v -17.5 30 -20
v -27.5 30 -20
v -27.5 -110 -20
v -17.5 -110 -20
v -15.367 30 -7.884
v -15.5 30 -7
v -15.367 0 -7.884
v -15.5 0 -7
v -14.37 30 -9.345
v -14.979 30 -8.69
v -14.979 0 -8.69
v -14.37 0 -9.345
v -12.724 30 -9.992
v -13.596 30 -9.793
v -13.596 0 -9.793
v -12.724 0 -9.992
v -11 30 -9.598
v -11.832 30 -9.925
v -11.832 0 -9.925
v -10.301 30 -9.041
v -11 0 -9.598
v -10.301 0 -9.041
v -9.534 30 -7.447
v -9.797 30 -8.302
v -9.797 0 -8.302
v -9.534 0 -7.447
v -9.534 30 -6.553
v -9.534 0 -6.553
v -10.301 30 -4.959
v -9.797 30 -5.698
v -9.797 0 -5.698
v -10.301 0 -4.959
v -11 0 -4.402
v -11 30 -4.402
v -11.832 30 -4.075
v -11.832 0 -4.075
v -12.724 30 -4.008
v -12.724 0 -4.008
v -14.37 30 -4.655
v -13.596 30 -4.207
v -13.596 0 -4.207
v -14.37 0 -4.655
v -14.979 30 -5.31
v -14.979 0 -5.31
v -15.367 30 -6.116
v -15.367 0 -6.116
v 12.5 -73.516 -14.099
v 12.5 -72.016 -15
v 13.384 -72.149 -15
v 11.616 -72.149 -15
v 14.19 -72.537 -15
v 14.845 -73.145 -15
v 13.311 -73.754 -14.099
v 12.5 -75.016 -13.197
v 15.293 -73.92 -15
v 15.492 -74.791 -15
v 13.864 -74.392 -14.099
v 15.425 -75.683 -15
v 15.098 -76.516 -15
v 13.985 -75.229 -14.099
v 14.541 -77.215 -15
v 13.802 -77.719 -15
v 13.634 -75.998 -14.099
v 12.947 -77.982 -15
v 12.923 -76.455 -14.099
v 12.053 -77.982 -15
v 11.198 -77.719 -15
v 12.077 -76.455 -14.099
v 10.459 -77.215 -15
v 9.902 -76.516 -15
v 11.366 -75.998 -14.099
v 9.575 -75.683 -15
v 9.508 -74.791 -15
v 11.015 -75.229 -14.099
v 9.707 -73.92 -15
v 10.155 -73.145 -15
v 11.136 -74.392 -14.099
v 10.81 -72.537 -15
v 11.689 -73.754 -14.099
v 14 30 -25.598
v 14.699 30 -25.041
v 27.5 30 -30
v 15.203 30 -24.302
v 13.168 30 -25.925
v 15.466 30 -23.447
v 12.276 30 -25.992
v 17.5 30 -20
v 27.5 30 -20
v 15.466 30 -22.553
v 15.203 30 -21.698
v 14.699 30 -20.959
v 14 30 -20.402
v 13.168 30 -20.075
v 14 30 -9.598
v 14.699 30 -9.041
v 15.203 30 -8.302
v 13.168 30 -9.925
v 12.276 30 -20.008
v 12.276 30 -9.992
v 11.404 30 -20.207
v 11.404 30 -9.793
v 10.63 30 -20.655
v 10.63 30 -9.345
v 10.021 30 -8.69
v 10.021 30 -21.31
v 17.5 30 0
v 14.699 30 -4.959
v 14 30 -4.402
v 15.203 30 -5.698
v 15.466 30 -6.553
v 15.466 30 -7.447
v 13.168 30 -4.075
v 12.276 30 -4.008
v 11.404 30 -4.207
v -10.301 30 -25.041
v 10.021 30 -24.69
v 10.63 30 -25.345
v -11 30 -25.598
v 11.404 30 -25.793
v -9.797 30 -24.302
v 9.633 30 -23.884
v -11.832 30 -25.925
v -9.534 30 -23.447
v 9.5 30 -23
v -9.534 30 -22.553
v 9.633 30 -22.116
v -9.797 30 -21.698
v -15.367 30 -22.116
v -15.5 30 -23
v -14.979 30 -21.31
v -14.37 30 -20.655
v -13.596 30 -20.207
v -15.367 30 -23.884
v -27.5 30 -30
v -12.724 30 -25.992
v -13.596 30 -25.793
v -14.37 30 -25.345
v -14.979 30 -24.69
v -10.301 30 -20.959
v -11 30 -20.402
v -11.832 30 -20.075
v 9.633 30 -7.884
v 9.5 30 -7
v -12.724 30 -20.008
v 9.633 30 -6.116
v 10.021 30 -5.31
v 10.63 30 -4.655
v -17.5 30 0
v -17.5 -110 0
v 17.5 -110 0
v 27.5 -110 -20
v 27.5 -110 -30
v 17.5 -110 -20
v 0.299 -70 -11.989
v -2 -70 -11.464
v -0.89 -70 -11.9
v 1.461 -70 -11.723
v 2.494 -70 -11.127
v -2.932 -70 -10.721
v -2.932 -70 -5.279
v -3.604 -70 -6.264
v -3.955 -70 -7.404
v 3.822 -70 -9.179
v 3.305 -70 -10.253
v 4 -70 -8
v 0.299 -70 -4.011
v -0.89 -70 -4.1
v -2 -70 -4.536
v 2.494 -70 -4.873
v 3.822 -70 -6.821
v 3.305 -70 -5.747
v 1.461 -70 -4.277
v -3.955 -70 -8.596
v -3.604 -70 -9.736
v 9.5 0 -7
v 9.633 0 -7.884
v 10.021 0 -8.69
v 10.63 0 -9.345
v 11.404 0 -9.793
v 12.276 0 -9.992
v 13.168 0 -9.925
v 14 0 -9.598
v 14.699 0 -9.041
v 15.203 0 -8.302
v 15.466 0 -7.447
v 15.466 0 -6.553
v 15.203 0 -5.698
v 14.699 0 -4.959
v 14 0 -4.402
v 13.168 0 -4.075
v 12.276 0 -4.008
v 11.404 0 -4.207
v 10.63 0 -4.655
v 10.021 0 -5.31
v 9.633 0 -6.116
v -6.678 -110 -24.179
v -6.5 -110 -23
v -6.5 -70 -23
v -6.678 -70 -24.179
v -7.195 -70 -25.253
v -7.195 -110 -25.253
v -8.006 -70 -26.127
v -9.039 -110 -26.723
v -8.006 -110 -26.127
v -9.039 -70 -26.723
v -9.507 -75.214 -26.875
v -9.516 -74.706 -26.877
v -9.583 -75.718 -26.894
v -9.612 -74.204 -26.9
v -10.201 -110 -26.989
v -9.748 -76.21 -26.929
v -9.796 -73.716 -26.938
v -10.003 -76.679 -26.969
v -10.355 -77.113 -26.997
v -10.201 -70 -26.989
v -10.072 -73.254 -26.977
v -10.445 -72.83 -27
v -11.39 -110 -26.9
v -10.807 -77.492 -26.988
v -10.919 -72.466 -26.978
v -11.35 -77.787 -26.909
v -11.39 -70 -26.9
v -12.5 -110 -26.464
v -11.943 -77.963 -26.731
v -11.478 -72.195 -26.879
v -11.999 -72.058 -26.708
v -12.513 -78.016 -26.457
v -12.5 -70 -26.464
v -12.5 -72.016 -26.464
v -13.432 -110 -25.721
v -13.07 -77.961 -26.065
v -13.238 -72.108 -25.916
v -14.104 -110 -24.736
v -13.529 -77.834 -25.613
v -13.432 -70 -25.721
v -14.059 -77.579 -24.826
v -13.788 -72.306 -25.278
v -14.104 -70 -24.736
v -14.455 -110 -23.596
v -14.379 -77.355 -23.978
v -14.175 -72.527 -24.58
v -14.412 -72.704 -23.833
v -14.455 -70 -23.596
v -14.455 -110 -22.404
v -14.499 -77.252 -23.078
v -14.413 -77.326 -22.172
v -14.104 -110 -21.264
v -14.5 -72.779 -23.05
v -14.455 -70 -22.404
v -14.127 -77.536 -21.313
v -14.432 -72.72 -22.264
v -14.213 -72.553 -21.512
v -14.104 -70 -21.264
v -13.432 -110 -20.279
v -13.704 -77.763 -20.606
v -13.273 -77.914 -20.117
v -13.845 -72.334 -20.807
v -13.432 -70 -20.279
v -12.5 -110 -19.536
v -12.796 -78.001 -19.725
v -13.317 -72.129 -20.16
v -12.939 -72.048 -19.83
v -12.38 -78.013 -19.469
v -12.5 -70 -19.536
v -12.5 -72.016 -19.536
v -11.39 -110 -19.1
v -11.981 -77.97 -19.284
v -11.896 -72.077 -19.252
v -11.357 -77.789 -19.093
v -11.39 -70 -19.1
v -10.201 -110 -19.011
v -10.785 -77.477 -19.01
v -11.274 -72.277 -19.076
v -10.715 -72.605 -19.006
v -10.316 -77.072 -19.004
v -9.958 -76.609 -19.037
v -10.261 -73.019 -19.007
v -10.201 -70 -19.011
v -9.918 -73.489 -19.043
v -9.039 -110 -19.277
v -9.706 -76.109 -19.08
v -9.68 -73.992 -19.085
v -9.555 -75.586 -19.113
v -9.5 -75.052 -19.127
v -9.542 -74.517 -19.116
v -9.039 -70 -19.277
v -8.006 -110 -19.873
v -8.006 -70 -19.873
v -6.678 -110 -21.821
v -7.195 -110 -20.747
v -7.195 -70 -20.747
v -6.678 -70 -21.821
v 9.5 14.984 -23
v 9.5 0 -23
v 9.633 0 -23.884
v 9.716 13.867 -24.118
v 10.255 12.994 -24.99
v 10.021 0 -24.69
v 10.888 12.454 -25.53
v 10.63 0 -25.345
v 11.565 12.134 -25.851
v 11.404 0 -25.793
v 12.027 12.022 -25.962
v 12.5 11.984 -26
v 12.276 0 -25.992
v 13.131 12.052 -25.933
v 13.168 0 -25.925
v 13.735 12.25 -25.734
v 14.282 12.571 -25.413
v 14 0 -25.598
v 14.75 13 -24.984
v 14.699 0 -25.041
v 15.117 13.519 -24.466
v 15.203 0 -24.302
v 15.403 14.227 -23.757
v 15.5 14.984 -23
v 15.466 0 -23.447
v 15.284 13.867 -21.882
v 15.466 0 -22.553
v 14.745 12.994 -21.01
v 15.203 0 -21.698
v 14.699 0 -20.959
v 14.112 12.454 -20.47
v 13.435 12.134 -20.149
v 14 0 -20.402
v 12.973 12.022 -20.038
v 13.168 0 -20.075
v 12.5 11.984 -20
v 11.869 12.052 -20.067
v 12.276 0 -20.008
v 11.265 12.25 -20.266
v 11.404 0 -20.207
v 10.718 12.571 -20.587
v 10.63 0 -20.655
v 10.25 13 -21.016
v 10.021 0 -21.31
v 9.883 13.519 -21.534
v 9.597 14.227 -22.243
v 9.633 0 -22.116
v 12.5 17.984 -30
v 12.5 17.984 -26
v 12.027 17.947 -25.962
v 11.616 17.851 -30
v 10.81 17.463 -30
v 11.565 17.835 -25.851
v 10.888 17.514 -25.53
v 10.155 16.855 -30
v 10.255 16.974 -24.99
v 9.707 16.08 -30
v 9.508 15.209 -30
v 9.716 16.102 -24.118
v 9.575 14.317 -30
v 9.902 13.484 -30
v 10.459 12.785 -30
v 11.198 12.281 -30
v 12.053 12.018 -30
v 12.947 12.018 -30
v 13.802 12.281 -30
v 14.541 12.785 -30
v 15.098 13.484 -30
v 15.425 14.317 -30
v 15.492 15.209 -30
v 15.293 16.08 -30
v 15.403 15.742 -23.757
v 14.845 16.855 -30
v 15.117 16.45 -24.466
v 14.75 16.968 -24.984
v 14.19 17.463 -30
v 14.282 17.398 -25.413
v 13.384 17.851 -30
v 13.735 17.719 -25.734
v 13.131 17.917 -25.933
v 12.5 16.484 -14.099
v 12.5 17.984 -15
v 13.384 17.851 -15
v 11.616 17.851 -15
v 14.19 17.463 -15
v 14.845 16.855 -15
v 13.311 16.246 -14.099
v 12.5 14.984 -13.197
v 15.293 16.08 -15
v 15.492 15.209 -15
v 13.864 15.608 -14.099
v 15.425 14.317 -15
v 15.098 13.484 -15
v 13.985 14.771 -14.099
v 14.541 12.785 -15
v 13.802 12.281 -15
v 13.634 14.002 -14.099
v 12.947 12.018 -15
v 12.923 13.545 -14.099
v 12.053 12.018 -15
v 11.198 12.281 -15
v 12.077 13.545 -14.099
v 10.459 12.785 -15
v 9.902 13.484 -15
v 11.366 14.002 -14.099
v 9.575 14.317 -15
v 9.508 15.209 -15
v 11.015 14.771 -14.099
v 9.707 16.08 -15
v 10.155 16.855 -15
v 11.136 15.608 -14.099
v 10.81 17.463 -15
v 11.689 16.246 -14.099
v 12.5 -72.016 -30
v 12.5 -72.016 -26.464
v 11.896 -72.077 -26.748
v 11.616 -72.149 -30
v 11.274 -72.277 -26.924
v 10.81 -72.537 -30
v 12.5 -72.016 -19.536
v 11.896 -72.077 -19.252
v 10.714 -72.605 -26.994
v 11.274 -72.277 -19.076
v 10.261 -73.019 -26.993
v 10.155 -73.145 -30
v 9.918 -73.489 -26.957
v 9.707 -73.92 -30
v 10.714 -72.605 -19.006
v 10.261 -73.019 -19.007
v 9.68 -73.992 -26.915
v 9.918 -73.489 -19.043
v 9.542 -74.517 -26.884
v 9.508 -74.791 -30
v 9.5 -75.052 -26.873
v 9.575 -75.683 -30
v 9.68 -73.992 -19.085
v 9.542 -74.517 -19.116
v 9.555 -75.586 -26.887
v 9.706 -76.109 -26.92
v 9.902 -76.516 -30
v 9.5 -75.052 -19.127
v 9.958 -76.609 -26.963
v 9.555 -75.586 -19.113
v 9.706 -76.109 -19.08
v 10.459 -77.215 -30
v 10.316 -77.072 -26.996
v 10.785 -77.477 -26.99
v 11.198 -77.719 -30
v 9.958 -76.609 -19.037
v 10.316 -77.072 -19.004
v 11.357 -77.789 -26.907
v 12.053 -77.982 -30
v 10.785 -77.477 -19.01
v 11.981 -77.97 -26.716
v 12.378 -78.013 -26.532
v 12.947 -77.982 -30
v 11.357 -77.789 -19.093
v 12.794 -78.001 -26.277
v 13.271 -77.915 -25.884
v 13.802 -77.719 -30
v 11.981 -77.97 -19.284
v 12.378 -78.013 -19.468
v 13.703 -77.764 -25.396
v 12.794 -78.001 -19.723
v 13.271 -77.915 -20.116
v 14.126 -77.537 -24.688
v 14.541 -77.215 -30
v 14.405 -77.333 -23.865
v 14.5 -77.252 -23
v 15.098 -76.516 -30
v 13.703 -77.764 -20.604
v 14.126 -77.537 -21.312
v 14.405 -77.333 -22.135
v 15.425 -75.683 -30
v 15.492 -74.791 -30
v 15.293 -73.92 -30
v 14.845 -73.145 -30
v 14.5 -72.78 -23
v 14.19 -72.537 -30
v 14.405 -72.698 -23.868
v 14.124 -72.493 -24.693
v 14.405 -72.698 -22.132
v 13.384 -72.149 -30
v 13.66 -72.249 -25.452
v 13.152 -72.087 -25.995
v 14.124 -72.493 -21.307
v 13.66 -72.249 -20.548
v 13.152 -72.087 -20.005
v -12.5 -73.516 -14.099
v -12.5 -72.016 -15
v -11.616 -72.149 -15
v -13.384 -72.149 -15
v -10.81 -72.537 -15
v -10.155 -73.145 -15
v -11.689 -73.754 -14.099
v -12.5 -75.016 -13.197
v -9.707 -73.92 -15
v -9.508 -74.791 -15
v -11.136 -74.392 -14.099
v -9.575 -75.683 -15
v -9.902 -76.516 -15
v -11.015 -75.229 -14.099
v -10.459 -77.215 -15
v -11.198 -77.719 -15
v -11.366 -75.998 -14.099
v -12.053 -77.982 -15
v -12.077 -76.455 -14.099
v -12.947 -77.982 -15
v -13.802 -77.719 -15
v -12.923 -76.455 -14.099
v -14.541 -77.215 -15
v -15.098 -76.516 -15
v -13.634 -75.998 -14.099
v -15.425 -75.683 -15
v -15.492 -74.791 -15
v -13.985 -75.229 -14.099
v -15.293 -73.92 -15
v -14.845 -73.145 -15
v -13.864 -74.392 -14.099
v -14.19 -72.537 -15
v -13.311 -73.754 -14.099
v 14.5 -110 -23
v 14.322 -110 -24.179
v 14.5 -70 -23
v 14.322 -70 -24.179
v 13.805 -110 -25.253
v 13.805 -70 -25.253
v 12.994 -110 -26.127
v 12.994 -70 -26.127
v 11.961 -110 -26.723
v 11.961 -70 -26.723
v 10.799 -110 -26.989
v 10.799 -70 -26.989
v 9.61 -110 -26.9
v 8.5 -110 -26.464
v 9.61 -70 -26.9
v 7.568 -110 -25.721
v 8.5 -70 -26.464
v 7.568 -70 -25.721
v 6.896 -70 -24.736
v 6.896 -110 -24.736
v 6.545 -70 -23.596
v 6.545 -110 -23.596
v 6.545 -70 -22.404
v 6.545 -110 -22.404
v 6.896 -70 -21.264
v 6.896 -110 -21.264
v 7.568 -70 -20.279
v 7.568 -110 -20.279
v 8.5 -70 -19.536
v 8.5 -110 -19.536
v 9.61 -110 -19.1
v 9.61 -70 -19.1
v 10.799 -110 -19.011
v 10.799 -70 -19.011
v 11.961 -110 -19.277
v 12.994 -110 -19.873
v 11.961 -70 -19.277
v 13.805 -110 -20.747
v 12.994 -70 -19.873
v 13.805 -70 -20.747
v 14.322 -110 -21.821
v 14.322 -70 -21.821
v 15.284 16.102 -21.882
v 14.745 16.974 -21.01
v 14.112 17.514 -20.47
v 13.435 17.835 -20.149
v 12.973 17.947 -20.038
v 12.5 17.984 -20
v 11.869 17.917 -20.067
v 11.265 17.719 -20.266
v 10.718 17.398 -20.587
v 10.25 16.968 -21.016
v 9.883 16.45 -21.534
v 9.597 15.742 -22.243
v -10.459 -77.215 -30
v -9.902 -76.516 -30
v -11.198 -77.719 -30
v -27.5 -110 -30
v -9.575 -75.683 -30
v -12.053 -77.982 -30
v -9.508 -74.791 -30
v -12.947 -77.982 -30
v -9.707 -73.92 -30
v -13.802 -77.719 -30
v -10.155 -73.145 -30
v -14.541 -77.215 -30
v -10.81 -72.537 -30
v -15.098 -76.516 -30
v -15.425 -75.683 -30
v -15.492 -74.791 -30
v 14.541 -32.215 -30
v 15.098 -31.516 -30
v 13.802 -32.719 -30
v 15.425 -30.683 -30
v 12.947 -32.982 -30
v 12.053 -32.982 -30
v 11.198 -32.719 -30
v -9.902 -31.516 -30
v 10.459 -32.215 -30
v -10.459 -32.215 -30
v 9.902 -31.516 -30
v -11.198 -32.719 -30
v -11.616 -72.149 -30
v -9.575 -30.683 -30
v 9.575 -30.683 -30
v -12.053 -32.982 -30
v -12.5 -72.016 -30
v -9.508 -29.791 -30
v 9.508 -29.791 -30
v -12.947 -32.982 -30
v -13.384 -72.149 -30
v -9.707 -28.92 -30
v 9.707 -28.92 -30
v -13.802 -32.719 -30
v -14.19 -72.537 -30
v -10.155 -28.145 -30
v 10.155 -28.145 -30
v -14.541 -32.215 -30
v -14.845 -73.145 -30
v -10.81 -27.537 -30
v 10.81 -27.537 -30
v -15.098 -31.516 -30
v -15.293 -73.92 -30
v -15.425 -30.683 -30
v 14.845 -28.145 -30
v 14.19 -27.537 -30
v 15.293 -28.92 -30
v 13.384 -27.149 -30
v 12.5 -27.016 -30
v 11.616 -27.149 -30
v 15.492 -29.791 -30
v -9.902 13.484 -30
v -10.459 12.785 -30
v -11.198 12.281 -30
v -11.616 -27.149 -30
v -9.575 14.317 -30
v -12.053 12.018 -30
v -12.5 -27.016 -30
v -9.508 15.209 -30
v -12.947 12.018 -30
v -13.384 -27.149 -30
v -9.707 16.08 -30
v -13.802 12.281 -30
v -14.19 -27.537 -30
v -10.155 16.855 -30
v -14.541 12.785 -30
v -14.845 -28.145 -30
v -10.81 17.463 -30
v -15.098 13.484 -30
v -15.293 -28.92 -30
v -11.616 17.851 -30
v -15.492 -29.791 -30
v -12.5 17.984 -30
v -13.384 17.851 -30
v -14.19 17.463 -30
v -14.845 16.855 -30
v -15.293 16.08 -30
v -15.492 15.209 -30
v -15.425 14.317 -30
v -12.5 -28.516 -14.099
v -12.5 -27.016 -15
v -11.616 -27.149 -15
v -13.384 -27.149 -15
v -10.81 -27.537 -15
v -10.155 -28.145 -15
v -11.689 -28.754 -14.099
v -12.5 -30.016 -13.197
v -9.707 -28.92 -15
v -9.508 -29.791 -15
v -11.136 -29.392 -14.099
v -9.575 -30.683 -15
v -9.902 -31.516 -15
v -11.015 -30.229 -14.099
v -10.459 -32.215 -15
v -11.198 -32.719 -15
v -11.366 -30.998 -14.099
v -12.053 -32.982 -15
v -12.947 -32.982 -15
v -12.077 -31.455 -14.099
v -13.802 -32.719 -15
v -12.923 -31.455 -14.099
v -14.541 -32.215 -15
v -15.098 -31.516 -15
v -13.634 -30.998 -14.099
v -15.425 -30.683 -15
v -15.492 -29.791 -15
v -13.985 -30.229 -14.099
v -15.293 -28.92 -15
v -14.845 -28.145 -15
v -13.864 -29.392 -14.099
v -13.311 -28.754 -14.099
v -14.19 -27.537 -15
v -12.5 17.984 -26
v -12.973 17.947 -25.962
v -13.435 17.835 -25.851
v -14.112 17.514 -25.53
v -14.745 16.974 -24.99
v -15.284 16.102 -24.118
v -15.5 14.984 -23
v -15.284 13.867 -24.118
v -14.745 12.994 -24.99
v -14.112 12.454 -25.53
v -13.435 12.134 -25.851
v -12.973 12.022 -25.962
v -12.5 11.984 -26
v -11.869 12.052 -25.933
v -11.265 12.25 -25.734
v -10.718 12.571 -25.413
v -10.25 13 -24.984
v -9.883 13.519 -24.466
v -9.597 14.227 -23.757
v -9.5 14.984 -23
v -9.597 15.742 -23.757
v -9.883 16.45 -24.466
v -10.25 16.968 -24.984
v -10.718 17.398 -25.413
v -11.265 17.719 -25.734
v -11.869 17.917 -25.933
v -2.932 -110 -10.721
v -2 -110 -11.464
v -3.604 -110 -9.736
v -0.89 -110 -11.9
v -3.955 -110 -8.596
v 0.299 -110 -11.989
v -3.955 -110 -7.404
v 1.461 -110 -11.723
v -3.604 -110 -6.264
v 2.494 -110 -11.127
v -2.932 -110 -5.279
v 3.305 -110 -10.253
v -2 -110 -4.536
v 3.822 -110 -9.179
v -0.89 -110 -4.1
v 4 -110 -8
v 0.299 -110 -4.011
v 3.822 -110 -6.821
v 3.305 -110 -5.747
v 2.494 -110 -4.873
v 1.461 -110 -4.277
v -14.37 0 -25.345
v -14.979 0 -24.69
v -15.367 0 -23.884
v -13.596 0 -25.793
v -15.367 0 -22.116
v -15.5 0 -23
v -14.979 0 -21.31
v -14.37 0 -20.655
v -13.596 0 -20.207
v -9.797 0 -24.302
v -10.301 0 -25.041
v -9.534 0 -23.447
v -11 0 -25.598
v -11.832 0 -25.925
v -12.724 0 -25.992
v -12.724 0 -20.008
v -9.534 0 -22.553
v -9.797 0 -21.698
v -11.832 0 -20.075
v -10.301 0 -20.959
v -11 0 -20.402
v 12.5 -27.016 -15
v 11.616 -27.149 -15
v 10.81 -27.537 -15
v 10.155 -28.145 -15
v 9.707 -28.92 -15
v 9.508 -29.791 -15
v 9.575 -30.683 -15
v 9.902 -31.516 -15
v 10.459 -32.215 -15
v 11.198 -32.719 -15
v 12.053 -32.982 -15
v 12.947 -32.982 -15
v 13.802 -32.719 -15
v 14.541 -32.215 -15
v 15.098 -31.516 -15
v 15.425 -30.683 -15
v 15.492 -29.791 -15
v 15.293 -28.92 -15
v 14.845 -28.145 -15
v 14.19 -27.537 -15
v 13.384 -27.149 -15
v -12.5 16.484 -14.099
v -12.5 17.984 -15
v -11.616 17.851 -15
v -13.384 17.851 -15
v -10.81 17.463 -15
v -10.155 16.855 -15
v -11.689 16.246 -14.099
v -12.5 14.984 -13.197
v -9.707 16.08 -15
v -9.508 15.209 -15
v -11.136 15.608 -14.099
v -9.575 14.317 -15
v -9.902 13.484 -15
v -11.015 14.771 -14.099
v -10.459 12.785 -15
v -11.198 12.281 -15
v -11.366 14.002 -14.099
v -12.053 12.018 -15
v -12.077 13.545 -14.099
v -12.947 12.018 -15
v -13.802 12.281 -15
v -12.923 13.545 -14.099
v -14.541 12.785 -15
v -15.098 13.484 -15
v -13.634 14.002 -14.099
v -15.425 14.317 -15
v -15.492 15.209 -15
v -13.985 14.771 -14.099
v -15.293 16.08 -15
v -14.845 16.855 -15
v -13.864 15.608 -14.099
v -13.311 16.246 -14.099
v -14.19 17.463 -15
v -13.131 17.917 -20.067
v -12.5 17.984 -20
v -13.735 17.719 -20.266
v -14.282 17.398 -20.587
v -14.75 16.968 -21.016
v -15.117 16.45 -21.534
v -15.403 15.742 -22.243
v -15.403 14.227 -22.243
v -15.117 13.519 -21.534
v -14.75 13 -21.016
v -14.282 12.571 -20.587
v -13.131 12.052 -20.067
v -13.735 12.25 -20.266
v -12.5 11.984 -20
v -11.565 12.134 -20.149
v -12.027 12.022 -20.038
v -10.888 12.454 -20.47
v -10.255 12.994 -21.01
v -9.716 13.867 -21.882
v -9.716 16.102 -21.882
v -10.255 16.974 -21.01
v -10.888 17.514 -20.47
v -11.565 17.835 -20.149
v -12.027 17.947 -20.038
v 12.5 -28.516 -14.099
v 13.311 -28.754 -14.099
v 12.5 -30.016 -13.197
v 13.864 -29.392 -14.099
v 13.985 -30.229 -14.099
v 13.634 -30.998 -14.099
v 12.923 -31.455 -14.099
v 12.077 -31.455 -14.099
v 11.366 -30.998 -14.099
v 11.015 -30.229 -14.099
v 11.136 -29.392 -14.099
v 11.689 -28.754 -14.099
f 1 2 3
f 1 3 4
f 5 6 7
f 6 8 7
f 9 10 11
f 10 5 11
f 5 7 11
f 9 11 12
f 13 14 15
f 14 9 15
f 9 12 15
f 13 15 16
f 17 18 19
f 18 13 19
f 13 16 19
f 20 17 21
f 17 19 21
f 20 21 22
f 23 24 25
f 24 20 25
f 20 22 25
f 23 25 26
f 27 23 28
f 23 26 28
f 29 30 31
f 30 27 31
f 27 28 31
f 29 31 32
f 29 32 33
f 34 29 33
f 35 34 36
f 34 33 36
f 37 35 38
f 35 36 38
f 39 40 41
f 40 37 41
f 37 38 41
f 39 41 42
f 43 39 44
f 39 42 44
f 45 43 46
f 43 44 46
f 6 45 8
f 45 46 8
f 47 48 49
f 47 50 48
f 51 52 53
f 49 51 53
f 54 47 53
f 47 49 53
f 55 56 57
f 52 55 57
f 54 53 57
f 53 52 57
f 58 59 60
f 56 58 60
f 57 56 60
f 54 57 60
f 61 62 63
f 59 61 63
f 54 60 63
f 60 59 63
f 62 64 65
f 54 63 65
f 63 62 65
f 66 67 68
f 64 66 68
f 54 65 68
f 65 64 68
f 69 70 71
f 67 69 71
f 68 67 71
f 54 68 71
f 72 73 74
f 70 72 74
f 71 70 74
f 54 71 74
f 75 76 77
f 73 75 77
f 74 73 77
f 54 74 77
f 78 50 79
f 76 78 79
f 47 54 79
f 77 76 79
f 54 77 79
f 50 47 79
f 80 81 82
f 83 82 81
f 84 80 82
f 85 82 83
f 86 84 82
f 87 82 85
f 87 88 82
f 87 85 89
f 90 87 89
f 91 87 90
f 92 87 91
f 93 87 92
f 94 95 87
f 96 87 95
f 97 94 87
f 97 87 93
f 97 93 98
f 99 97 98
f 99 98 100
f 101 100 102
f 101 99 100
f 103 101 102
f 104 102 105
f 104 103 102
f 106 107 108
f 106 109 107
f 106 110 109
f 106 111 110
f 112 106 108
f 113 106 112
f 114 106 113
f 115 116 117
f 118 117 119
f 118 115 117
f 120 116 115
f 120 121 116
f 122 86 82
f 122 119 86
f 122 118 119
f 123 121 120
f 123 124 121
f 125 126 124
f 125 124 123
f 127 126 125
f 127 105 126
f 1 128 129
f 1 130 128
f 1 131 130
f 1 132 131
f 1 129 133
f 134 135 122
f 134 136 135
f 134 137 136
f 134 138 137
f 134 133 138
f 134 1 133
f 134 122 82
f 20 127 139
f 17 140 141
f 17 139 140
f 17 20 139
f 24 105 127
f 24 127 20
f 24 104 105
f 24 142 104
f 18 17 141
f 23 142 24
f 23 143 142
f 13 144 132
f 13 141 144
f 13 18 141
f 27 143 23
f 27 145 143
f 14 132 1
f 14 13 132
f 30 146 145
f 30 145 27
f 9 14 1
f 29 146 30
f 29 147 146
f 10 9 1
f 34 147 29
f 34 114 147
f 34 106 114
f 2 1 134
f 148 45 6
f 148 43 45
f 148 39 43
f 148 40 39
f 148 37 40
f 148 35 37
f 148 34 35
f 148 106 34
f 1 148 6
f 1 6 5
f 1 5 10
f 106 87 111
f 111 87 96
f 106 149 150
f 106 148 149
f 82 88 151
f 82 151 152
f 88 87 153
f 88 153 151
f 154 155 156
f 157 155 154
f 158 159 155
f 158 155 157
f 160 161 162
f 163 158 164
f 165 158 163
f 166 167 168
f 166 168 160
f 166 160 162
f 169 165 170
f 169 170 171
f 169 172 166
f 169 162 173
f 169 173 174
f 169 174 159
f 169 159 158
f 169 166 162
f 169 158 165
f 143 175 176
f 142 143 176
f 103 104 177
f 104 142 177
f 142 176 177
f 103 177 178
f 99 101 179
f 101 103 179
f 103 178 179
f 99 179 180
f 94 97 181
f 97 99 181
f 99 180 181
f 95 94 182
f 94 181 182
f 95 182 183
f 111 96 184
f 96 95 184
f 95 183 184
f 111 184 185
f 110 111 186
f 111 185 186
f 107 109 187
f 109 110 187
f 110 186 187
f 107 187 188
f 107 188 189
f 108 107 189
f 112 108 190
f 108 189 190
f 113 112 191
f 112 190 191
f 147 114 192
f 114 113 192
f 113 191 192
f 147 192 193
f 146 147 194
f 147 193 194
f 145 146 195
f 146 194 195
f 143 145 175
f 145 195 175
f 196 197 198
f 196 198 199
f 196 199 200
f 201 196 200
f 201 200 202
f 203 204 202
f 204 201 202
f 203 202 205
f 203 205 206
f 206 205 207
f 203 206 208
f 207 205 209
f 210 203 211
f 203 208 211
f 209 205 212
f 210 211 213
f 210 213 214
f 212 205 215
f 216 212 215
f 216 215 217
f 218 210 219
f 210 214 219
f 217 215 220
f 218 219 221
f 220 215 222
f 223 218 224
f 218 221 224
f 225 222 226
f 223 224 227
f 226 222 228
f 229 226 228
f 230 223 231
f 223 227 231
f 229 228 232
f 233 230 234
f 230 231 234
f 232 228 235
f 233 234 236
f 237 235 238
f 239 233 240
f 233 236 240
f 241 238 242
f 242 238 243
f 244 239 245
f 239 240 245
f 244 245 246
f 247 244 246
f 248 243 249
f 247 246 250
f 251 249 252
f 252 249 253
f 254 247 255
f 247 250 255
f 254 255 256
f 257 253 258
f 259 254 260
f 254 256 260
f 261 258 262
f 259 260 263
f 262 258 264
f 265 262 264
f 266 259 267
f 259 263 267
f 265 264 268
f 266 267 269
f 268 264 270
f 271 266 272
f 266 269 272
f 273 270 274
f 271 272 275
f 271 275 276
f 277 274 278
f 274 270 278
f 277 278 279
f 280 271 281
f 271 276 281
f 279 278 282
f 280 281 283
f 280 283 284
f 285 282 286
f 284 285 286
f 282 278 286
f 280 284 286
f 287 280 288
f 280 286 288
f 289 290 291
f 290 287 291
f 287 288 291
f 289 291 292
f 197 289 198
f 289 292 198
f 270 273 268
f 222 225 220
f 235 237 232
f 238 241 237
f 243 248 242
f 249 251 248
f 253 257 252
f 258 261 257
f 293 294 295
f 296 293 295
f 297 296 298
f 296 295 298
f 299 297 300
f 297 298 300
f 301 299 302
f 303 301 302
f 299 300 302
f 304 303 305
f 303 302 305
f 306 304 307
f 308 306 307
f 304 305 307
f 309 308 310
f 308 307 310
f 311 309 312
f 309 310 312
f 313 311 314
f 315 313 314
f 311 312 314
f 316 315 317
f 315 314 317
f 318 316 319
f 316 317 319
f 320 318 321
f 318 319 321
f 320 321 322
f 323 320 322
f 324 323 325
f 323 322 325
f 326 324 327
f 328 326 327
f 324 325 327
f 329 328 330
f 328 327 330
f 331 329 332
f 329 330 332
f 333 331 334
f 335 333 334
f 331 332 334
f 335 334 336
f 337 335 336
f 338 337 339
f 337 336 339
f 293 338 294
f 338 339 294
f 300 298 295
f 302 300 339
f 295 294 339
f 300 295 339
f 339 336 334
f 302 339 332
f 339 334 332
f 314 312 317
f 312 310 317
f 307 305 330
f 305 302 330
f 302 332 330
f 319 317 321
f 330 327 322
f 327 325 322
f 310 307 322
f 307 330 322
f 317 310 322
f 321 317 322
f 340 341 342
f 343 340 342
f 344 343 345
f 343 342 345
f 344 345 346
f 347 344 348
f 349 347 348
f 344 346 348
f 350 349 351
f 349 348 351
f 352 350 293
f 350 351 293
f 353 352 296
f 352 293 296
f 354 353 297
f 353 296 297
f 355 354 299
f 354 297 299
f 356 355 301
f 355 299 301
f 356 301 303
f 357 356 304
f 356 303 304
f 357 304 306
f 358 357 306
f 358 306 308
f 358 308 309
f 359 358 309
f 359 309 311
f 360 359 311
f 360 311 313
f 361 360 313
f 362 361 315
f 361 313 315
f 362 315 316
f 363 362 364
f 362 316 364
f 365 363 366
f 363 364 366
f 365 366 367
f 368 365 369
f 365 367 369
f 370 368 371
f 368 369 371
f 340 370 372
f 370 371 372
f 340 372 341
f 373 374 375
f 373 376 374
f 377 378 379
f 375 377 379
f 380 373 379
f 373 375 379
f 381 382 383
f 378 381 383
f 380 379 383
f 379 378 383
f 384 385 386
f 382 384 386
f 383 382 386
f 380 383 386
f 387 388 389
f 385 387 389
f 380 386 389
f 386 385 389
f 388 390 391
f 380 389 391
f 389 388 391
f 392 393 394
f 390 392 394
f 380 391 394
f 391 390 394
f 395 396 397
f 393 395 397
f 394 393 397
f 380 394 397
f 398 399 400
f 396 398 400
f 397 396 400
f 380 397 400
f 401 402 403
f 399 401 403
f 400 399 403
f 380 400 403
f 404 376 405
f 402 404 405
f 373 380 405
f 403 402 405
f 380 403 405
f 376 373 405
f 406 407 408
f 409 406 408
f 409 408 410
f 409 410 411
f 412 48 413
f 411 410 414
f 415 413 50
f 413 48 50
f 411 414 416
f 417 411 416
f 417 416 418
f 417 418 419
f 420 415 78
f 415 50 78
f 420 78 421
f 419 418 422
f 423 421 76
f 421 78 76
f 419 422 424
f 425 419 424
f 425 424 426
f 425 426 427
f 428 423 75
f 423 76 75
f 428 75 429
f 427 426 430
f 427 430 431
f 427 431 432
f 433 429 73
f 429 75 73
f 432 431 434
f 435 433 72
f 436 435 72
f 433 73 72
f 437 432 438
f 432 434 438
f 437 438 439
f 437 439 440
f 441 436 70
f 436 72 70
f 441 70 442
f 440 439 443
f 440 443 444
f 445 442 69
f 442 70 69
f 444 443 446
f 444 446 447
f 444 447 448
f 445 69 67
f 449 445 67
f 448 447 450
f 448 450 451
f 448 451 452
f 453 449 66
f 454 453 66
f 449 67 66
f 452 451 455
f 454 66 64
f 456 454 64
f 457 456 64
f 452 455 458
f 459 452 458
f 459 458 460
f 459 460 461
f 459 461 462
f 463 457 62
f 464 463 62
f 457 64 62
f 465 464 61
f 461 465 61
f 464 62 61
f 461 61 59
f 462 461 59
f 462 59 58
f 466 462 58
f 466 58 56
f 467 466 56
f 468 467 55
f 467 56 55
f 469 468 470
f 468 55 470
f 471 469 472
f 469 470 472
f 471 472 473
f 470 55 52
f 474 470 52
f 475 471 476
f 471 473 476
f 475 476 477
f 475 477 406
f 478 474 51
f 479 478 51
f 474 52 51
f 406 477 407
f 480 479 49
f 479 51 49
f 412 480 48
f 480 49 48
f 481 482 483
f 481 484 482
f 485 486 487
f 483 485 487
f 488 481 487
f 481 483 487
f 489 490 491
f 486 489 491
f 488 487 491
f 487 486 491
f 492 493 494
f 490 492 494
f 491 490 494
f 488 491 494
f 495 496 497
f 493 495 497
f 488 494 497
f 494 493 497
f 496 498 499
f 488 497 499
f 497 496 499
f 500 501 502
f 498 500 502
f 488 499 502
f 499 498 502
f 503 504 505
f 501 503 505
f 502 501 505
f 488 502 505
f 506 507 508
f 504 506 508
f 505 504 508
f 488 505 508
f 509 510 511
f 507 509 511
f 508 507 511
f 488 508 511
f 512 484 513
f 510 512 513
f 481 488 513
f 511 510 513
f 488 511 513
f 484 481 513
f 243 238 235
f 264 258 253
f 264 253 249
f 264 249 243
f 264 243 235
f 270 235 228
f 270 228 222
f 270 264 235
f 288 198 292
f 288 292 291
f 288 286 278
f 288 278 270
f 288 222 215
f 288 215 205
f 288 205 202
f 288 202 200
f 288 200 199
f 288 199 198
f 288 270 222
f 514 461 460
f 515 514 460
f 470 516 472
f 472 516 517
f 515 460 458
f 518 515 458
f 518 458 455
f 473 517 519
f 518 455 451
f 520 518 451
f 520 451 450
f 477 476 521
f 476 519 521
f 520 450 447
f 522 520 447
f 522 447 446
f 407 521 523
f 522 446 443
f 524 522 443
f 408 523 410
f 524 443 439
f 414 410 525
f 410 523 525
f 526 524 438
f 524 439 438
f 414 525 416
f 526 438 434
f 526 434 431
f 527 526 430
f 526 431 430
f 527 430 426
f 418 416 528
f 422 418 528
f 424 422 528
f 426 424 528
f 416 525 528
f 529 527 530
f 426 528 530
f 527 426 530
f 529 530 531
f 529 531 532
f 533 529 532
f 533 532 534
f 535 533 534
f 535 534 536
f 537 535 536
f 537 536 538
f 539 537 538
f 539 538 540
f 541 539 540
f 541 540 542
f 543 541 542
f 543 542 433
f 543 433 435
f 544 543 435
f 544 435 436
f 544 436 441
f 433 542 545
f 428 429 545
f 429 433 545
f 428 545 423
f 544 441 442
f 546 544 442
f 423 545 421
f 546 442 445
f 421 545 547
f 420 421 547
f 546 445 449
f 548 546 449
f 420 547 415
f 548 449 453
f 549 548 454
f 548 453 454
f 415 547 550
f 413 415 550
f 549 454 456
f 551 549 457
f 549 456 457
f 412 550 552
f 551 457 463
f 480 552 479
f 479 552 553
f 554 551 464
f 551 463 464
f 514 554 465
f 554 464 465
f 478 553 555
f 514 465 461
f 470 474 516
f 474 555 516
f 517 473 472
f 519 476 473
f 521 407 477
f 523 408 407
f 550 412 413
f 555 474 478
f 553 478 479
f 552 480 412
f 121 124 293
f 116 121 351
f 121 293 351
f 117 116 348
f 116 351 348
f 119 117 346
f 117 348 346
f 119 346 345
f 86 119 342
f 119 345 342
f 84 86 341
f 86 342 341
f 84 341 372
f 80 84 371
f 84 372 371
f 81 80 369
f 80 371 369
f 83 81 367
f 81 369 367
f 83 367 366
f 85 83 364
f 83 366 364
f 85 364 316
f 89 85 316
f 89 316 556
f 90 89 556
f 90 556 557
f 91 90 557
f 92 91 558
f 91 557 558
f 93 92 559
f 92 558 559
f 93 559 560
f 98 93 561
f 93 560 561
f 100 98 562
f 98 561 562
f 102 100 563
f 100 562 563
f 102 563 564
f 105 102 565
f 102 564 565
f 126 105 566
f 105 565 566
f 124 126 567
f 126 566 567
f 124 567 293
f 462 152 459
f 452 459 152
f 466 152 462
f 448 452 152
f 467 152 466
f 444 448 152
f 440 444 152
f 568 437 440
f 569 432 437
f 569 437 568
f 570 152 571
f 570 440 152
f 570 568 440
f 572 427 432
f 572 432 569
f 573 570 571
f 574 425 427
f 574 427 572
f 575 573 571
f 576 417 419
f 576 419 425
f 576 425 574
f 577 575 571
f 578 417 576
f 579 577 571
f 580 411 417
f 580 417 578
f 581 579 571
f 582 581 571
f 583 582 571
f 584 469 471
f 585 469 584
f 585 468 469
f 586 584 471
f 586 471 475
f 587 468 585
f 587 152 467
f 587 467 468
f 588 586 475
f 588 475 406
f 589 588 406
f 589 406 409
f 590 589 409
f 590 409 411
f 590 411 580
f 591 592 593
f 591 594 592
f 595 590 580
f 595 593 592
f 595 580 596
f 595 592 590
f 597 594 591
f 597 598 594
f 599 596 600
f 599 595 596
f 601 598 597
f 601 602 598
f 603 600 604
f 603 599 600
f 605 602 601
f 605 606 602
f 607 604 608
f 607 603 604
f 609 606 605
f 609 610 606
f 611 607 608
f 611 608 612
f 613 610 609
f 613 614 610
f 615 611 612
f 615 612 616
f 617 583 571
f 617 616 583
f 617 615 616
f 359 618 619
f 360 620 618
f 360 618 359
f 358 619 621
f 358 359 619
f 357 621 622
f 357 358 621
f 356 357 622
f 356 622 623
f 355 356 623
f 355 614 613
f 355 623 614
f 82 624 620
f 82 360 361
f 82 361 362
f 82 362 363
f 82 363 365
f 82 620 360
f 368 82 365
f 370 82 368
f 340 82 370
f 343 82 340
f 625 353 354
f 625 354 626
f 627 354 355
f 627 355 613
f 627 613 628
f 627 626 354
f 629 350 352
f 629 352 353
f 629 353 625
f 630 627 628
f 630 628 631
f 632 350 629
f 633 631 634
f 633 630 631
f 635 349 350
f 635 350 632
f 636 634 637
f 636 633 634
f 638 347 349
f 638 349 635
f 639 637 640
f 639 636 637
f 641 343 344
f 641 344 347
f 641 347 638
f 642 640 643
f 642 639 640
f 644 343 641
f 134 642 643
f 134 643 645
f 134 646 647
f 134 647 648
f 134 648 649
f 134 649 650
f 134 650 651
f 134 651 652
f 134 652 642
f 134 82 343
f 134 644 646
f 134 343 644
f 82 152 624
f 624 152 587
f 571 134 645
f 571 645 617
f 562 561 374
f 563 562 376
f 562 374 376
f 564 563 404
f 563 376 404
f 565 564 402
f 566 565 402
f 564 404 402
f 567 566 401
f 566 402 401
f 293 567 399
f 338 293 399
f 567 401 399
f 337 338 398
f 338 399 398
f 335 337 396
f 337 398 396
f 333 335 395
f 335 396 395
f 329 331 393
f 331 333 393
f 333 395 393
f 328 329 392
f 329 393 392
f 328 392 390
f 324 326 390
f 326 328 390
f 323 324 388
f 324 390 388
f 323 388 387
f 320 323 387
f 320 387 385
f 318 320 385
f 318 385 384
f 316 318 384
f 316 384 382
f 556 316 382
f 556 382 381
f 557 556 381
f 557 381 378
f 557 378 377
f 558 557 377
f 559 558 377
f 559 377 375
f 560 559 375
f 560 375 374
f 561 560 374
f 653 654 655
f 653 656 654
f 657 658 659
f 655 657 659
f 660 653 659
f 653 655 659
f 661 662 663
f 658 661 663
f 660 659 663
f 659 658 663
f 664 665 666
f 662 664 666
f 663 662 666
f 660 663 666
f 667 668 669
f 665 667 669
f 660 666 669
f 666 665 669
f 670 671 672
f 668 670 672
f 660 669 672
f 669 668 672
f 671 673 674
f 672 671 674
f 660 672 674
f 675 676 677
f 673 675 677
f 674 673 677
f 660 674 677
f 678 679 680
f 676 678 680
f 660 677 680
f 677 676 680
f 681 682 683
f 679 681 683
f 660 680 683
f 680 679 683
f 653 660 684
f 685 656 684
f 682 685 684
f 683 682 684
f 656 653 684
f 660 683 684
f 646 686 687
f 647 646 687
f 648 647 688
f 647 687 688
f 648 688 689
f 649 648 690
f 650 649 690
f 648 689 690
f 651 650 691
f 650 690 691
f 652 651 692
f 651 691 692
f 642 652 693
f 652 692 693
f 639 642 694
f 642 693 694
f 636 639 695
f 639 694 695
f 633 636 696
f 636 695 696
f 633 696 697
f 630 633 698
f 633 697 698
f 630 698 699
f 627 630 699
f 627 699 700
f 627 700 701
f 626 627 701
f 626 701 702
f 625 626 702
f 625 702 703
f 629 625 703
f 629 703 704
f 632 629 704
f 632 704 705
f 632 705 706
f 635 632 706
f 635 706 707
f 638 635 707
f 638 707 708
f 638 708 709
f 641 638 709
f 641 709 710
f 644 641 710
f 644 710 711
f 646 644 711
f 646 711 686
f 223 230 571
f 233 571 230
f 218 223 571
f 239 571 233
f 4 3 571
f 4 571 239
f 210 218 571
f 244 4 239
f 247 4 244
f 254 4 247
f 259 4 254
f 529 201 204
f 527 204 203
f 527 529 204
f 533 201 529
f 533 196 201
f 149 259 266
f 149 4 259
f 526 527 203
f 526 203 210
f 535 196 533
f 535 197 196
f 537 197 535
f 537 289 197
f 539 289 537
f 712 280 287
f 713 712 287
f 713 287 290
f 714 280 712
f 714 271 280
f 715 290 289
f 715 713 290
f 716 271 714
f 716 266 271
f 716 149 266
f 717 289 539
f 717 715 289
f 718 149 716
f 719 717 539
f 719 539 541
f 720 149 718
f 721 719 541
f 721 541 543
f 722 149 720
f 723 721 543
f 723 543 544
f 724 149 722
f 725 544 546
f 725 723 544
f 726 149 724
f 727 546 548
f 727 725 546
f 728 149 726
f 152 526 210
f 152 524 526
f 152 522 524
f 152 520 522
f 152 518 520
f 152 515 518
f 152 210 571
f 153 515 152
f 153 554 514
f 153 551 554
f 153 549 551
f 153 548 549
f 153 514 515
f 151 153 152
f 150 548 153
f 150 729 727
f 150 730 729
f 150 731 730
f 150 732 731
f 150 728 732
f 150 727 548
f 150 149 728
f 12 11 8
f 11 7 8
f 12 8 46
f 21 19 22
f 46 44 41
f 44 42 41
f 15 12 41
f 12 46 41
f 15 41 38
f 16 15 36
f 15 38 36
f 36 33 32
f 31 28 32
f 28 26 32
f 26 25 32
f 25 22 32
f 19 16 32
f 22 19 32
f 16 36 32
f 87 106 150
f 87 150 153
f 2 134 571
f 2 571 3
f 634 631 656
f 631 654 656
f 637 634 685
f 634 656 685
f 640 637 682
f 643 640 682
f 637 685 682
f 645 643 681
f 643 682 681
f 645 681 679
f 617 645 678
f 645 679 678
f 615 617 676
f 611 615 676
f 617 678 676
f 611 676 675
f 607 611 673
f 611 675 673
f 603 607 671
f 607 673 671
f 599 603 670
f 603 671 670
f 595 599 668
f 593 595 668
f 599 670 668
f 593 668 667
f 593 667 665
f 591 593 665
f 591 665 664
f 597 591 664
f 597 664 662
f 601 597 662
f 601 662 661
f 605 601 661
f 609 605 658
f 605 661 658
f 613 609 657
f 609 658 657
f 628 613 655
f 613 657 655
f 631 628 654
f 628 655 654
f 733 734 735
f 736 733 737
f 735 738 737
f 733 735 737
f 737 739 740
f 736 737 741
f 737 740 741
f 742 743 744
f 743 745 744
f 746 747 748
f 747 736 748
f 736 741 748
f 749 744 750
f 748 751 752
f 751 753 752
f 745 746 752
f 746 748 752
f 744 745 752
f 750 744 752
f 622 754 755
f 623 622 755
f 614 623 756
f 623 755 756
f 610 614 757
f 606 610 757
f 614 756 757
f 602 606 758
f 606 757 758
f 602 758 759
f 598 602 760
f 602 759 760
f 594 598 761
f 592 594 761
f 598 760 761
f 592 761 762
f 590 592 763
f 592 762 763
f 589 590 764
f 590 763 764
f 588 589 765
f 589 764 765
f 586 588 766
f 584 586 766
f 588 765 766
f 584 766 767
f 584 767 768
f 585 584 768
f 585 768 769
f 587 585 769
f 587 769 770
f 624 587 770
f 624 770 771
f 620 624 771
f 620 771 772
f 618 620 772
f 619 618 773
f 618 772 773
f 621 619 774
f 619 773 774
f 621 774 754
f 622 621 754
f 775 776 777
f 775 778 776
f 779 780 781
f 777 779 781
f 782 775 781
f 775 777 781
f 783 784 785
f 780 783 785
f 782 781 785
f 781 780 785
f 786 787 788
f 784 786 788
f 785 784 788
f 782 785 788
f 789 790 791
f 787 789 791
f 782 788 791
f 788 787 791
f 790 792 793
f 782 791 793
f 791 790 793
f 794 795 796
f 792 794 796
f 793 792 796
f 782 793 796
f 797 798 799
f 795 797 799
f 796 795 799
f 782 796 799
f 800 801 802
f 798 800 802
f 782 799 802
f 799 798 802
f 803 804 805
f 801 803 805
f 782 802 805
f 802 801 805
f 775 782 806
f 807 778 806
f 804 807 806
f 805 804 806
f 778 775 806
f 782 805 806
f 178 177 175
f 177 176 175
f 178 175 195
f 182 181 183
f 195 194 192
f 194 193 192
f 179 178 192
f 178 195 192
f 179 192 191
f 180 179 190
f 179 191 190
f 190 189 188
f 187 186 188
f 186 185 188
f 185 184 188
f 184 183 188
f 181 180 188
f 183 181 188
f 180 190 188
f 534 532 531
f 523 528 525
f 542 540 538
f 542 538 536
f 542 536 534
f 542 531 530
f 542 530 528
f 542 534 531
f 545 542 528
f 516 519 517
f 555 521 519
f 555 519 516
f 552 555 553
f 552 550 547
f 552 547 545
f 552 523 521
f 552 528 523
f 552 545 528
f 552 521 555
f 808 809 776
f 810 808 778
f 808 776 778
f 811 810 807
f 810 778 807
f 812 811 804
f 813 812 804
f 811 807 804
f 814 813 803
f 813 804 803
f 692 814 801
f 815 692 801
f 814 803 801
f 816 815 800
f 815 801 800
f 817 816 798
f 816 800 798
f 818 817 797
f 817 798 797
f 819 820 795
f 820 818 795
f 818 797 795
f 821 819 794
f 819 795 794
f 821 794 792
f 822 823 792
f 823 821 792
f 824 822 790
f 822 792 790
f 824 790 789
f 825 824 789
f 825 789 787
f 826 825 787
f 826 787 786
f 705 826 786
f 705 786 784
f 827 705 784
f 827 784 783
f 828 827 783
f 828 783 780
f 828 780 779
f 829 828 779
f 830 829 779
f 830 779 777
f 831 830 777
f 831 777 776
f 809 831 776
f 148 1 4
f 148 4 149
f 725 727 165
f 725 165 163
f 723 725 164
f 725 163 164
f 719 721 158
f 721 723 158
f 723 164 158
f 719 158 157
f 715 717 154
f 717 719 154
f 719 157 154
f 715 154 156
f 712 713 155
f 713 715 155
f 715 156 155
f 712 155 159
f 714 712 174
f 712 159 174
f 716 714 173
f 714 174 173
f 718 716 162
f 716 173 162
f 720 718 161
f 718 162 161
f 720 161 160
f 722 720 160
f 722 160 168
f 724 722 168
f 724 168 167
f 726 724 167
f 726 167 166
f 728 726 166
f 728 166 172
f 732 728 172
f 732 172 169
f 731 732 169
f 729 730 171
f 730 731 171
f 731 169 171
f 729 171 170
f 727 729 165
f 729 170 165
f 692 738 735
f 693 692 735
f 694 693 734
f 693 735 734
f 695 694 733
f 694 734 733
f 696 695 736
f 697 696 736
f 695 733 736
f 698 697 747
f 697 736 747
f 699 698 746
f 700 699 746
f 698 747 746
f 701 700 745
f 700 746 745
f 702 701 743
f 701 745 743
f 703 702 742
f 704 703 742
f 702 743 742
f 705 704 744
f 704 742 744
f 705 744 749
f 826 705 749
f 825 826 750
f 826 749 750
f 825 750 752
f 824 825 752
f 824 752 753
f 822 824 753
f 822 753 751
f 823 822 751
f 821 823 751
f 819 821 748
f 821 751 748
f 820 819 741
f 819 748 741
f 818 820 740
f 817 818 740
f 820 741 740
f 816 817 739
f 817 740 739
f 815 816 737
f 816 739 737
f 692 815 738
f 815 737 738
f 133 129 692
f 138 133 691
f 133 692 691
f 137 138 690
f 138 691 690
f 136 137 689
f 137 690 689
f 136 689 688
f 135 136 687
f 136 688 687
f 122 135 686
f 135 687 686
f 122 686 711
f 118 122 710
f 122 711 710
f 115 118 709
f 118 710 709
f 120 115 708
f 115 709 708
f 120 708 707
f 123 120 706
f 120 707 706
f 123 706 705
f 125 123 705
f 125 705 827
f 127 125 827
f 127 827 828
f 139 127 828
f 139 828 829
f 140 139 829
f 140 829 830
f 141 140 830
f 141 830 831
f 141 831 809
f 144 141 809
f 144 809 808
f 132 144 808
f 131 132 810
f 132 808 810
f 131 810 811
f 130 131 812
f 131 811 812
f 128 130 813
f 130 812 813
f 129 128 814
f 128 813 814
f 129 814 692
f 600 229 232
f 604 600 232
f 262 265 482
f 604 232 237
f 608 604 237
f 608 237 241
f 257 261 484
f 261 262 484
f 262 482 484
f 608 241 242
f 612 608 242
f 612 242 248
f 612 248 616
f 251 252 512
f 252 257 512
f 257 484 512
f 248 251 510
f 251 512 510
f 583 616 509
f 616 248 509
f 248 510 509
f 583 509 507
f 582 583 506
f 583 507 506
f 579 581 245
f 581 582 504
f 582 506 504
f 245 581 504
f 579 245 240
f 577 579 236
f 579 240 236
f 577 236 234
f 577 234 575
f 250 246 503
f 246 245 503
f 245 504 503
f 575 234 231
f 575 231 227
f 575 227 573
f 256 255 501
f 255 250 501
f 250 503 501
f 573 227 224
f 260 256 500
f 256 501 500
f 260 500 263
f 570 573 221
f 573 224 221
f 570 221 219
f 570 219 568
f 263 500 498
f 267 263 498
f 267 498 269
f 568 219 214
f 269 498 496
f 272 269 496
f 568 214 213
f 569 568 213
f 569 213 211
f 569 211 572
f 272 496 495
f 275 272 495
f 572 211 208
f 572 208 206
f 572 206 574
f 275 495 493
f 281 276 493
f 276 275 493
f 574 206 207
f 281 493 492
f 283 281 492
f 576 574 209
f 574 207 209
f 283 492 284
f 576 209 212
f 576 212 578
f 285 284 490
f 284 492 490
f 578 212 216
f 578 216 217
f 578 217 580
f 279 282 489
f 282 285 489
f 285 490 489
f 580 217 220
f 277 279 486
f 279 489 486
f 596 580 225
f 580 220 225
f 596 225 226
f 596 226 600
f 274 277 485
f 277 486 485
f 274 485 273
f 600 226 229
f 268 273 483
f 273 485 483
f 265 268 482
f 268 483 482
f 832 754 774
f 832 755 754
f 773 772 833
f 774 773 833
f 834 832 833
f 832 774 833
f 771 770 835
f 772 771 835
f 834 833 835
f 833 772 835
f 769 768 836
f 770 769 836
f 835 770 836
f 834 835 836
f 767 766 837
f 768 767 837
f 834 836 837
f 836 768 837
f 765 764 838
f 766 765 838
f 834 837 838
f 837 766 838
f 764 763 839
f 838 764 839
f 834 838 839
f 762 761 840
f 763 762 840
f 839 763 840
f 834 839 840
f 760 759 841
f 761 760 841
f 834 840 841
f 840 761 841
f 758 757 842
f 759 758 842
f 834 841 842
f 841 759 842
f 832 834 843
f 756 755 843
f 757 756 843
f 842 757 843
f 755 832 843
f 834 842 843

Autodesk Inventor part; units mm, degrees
ref_plane "YZ Plane" through (0, 0, 0) normal (1, 0, 0) x (0, 1, 0)
ref_plane "XZ Plane" through (0, 0, 0) normal (0, 1, 0) x (-1, 0, 0)
ref_plane "XY Plane" through (0, 0, 0) normal (0, 0, 1) x (1, 0, 0)
sketch "Sketch1" plane through (0, 0, 0) normal (0, 1, 0) x (-1, 0, 0)
  line L0 (17.5, 0) -> (-17.5, 0)
  line L1 (27.5, -30) -> (-27.5, -30)
  line L2 (27.5, -30) -> (27.5, -20)
  line L3 (27.5, -20) -> (17.5, -20)
  line L4 (-27.5, -30) -> (-27.5, -20)
  line L5 (-27.5, -20) -> (-17.5, -20)
  line L6 (17.5, -20) -> (17.5, 0)
  line L7 (-17.5, -20) -> (-17.5, 0)
  circle A0 centre (12.5, -23) radius 3
  circle A1 centre (-12.5, -23) radius 3
  circle A2 centre (-12.5, -7) radius 3
  circle A3 centre (12.5, -7) radius 3
  point P0 (0, 0)
  dimension "d2" = 35
  dimension "d8" = 55
  dimension "d9" = 10
  dimension "d10" = 10
  dimension "d11" = 6
  dimension "d12" = 6
  dimension "d13" = 6
  dimension "d14" = 6
  dimension "d17" = 7
  dimension "d18" = 16
extrude "Extrusion1" add sketch "Sketch1" along normal blind 30
sketch "Sketch4" plane through (0, 0, 0) normal (0, -1, 0) x (1, 0, 0)
  line L0 (27.5, -20) -> (27.5, -30) projected
  line L1 (27.5, -30) -> (-27.5, -30) projected
  line L2 (27.5, -30) -> (-27.5, -30)
  line L3 (-27.5, -30) -> (-27.5, -20) projected
  line L4 (-27.5, -30) -> (-27.5, -20)
  line L5 (-27.5, -20) -> (-17.5, -20) projected
  line L6 (-27.5, -20) -> (-17.5, -20)
  line L7 (-17.5, -20) -> (-17.5, 0) projected
  line L8 (-17.5, -20) -> (-17.5, 0)
  line L9 (-17.5, 0) -> (17.5, 0) projected
  line L10 (-17.5, 0) -> (17.5, 0)
  line L11 (17.5, 0) -> (17.5, -20) projected
  line L12 (17.5, 0) -> (17.5, -20)
  line L13 (17.5, -20) -> (27.5, -20)
  line L14 (27.5, -20) -> (27.5, -30)
  point P0 (0, 0)
extrude "Extrusion3" add sketch "Sketch4" along normal blind 70
sketch "Sketch5" plane through (0, -70, 0) normal (0, -1, 0) x (1, 0, 0)
  line L0 (27.5, -30) -> (-27.5, -30) projected
  line L1 (27.5, -30) -> (-27.5, -30)
  line L2 (-27.5, -30) -> (-27.5, -20) projected
  line L3 (-27.5, -30) -> (-27.5, -20)
  line L4 (-27.5, -20) -> (-17.5, -20) projected
  line L5 (-27.5, -20) -> (-17.5, -20)
  line L6 (-17.5, -20) -> (-17.5, 0) projected
  line L7 (-17.5, -20) -> (-17.5, 0)
  line L8 (-17.5, 0) -> (17.5, 0)
  line L9 (17.5, 0) -> (17.5, -20) projected
  line L10 (17.5, 0) -> (17.5, -20)
  line L11 (17.5, -20) -> (27.5, -20) projected
  line L12 (17.5, -20) -> (27.5, -20)
  line L13 (27.5, -20) -> (27.5, -30) projected
  line L14 (27.5, -20) -> (27.5, -30)
  circle A0 centre (0, -8) radius 4
  circle A1 centre (10.5, -23) radius 4
  circle A2 centre (-10.5, -23) radius 4
  point P0 (0, 0)
  dimension "d25" = 8
  dimension "d26" = 8
  dimension "d27" = 8
  dimension "d28" = 10.5
  dimension "d29" = 10.5
  dimension "d30" = 8
  dimension "d31" = 15
extrude "Extrusion4" add sketch "Sketch5" along normal blind 40
sketch "Sketch6" plane through (27.5, 30, -30) normal (0, 0, -1) x (-1, 0, 0)
  circle A0 centre (40, -105.0156) radius 3
  circle A1 centre (15, -105.0156) radius 3
  circle A2 centre (15, -60.0156) radius 3
  line L0 (55, -140) -> (0, -140) projected
  line L1 (27.5, 4.7422) -> (27.5, -229.8437)
  line L2 (55, -140) -> (55, 0) projected
  circle A3 centre (40, -60.0156) radius 3
  circle A4 centre (15, -15.0156) radius 3
  circle A5 centre (40, -15.0156) radius 3
  point P0 (27.5, -30)
  dimension "d35" = 6
  dimension "d38" = 6
  dimension "d39" = 6
  dimension "d42" = 45
  dimension "d43" = 27.5
  dimension "d44" = 12.5
  dimension "d53" = 6
  dimension "d54" = 6
  dimension "d55" = 6
  dimension "d56" = 45
  dimension "d57" = 45
hole "Hole1" at (-12.5, -75.0156, -30) at (12.5, -75.0156, -30) at (-12.5, -30.0156, -30) at (12.5, -30.0156, -30) at (12.5, 14.9844, -30) at (-12.5, 14.9844, -30) direction (0, 0, 1) diameter 6 depth 15 tip angle 118
properties part number "Fuhrung" material "Steel"
